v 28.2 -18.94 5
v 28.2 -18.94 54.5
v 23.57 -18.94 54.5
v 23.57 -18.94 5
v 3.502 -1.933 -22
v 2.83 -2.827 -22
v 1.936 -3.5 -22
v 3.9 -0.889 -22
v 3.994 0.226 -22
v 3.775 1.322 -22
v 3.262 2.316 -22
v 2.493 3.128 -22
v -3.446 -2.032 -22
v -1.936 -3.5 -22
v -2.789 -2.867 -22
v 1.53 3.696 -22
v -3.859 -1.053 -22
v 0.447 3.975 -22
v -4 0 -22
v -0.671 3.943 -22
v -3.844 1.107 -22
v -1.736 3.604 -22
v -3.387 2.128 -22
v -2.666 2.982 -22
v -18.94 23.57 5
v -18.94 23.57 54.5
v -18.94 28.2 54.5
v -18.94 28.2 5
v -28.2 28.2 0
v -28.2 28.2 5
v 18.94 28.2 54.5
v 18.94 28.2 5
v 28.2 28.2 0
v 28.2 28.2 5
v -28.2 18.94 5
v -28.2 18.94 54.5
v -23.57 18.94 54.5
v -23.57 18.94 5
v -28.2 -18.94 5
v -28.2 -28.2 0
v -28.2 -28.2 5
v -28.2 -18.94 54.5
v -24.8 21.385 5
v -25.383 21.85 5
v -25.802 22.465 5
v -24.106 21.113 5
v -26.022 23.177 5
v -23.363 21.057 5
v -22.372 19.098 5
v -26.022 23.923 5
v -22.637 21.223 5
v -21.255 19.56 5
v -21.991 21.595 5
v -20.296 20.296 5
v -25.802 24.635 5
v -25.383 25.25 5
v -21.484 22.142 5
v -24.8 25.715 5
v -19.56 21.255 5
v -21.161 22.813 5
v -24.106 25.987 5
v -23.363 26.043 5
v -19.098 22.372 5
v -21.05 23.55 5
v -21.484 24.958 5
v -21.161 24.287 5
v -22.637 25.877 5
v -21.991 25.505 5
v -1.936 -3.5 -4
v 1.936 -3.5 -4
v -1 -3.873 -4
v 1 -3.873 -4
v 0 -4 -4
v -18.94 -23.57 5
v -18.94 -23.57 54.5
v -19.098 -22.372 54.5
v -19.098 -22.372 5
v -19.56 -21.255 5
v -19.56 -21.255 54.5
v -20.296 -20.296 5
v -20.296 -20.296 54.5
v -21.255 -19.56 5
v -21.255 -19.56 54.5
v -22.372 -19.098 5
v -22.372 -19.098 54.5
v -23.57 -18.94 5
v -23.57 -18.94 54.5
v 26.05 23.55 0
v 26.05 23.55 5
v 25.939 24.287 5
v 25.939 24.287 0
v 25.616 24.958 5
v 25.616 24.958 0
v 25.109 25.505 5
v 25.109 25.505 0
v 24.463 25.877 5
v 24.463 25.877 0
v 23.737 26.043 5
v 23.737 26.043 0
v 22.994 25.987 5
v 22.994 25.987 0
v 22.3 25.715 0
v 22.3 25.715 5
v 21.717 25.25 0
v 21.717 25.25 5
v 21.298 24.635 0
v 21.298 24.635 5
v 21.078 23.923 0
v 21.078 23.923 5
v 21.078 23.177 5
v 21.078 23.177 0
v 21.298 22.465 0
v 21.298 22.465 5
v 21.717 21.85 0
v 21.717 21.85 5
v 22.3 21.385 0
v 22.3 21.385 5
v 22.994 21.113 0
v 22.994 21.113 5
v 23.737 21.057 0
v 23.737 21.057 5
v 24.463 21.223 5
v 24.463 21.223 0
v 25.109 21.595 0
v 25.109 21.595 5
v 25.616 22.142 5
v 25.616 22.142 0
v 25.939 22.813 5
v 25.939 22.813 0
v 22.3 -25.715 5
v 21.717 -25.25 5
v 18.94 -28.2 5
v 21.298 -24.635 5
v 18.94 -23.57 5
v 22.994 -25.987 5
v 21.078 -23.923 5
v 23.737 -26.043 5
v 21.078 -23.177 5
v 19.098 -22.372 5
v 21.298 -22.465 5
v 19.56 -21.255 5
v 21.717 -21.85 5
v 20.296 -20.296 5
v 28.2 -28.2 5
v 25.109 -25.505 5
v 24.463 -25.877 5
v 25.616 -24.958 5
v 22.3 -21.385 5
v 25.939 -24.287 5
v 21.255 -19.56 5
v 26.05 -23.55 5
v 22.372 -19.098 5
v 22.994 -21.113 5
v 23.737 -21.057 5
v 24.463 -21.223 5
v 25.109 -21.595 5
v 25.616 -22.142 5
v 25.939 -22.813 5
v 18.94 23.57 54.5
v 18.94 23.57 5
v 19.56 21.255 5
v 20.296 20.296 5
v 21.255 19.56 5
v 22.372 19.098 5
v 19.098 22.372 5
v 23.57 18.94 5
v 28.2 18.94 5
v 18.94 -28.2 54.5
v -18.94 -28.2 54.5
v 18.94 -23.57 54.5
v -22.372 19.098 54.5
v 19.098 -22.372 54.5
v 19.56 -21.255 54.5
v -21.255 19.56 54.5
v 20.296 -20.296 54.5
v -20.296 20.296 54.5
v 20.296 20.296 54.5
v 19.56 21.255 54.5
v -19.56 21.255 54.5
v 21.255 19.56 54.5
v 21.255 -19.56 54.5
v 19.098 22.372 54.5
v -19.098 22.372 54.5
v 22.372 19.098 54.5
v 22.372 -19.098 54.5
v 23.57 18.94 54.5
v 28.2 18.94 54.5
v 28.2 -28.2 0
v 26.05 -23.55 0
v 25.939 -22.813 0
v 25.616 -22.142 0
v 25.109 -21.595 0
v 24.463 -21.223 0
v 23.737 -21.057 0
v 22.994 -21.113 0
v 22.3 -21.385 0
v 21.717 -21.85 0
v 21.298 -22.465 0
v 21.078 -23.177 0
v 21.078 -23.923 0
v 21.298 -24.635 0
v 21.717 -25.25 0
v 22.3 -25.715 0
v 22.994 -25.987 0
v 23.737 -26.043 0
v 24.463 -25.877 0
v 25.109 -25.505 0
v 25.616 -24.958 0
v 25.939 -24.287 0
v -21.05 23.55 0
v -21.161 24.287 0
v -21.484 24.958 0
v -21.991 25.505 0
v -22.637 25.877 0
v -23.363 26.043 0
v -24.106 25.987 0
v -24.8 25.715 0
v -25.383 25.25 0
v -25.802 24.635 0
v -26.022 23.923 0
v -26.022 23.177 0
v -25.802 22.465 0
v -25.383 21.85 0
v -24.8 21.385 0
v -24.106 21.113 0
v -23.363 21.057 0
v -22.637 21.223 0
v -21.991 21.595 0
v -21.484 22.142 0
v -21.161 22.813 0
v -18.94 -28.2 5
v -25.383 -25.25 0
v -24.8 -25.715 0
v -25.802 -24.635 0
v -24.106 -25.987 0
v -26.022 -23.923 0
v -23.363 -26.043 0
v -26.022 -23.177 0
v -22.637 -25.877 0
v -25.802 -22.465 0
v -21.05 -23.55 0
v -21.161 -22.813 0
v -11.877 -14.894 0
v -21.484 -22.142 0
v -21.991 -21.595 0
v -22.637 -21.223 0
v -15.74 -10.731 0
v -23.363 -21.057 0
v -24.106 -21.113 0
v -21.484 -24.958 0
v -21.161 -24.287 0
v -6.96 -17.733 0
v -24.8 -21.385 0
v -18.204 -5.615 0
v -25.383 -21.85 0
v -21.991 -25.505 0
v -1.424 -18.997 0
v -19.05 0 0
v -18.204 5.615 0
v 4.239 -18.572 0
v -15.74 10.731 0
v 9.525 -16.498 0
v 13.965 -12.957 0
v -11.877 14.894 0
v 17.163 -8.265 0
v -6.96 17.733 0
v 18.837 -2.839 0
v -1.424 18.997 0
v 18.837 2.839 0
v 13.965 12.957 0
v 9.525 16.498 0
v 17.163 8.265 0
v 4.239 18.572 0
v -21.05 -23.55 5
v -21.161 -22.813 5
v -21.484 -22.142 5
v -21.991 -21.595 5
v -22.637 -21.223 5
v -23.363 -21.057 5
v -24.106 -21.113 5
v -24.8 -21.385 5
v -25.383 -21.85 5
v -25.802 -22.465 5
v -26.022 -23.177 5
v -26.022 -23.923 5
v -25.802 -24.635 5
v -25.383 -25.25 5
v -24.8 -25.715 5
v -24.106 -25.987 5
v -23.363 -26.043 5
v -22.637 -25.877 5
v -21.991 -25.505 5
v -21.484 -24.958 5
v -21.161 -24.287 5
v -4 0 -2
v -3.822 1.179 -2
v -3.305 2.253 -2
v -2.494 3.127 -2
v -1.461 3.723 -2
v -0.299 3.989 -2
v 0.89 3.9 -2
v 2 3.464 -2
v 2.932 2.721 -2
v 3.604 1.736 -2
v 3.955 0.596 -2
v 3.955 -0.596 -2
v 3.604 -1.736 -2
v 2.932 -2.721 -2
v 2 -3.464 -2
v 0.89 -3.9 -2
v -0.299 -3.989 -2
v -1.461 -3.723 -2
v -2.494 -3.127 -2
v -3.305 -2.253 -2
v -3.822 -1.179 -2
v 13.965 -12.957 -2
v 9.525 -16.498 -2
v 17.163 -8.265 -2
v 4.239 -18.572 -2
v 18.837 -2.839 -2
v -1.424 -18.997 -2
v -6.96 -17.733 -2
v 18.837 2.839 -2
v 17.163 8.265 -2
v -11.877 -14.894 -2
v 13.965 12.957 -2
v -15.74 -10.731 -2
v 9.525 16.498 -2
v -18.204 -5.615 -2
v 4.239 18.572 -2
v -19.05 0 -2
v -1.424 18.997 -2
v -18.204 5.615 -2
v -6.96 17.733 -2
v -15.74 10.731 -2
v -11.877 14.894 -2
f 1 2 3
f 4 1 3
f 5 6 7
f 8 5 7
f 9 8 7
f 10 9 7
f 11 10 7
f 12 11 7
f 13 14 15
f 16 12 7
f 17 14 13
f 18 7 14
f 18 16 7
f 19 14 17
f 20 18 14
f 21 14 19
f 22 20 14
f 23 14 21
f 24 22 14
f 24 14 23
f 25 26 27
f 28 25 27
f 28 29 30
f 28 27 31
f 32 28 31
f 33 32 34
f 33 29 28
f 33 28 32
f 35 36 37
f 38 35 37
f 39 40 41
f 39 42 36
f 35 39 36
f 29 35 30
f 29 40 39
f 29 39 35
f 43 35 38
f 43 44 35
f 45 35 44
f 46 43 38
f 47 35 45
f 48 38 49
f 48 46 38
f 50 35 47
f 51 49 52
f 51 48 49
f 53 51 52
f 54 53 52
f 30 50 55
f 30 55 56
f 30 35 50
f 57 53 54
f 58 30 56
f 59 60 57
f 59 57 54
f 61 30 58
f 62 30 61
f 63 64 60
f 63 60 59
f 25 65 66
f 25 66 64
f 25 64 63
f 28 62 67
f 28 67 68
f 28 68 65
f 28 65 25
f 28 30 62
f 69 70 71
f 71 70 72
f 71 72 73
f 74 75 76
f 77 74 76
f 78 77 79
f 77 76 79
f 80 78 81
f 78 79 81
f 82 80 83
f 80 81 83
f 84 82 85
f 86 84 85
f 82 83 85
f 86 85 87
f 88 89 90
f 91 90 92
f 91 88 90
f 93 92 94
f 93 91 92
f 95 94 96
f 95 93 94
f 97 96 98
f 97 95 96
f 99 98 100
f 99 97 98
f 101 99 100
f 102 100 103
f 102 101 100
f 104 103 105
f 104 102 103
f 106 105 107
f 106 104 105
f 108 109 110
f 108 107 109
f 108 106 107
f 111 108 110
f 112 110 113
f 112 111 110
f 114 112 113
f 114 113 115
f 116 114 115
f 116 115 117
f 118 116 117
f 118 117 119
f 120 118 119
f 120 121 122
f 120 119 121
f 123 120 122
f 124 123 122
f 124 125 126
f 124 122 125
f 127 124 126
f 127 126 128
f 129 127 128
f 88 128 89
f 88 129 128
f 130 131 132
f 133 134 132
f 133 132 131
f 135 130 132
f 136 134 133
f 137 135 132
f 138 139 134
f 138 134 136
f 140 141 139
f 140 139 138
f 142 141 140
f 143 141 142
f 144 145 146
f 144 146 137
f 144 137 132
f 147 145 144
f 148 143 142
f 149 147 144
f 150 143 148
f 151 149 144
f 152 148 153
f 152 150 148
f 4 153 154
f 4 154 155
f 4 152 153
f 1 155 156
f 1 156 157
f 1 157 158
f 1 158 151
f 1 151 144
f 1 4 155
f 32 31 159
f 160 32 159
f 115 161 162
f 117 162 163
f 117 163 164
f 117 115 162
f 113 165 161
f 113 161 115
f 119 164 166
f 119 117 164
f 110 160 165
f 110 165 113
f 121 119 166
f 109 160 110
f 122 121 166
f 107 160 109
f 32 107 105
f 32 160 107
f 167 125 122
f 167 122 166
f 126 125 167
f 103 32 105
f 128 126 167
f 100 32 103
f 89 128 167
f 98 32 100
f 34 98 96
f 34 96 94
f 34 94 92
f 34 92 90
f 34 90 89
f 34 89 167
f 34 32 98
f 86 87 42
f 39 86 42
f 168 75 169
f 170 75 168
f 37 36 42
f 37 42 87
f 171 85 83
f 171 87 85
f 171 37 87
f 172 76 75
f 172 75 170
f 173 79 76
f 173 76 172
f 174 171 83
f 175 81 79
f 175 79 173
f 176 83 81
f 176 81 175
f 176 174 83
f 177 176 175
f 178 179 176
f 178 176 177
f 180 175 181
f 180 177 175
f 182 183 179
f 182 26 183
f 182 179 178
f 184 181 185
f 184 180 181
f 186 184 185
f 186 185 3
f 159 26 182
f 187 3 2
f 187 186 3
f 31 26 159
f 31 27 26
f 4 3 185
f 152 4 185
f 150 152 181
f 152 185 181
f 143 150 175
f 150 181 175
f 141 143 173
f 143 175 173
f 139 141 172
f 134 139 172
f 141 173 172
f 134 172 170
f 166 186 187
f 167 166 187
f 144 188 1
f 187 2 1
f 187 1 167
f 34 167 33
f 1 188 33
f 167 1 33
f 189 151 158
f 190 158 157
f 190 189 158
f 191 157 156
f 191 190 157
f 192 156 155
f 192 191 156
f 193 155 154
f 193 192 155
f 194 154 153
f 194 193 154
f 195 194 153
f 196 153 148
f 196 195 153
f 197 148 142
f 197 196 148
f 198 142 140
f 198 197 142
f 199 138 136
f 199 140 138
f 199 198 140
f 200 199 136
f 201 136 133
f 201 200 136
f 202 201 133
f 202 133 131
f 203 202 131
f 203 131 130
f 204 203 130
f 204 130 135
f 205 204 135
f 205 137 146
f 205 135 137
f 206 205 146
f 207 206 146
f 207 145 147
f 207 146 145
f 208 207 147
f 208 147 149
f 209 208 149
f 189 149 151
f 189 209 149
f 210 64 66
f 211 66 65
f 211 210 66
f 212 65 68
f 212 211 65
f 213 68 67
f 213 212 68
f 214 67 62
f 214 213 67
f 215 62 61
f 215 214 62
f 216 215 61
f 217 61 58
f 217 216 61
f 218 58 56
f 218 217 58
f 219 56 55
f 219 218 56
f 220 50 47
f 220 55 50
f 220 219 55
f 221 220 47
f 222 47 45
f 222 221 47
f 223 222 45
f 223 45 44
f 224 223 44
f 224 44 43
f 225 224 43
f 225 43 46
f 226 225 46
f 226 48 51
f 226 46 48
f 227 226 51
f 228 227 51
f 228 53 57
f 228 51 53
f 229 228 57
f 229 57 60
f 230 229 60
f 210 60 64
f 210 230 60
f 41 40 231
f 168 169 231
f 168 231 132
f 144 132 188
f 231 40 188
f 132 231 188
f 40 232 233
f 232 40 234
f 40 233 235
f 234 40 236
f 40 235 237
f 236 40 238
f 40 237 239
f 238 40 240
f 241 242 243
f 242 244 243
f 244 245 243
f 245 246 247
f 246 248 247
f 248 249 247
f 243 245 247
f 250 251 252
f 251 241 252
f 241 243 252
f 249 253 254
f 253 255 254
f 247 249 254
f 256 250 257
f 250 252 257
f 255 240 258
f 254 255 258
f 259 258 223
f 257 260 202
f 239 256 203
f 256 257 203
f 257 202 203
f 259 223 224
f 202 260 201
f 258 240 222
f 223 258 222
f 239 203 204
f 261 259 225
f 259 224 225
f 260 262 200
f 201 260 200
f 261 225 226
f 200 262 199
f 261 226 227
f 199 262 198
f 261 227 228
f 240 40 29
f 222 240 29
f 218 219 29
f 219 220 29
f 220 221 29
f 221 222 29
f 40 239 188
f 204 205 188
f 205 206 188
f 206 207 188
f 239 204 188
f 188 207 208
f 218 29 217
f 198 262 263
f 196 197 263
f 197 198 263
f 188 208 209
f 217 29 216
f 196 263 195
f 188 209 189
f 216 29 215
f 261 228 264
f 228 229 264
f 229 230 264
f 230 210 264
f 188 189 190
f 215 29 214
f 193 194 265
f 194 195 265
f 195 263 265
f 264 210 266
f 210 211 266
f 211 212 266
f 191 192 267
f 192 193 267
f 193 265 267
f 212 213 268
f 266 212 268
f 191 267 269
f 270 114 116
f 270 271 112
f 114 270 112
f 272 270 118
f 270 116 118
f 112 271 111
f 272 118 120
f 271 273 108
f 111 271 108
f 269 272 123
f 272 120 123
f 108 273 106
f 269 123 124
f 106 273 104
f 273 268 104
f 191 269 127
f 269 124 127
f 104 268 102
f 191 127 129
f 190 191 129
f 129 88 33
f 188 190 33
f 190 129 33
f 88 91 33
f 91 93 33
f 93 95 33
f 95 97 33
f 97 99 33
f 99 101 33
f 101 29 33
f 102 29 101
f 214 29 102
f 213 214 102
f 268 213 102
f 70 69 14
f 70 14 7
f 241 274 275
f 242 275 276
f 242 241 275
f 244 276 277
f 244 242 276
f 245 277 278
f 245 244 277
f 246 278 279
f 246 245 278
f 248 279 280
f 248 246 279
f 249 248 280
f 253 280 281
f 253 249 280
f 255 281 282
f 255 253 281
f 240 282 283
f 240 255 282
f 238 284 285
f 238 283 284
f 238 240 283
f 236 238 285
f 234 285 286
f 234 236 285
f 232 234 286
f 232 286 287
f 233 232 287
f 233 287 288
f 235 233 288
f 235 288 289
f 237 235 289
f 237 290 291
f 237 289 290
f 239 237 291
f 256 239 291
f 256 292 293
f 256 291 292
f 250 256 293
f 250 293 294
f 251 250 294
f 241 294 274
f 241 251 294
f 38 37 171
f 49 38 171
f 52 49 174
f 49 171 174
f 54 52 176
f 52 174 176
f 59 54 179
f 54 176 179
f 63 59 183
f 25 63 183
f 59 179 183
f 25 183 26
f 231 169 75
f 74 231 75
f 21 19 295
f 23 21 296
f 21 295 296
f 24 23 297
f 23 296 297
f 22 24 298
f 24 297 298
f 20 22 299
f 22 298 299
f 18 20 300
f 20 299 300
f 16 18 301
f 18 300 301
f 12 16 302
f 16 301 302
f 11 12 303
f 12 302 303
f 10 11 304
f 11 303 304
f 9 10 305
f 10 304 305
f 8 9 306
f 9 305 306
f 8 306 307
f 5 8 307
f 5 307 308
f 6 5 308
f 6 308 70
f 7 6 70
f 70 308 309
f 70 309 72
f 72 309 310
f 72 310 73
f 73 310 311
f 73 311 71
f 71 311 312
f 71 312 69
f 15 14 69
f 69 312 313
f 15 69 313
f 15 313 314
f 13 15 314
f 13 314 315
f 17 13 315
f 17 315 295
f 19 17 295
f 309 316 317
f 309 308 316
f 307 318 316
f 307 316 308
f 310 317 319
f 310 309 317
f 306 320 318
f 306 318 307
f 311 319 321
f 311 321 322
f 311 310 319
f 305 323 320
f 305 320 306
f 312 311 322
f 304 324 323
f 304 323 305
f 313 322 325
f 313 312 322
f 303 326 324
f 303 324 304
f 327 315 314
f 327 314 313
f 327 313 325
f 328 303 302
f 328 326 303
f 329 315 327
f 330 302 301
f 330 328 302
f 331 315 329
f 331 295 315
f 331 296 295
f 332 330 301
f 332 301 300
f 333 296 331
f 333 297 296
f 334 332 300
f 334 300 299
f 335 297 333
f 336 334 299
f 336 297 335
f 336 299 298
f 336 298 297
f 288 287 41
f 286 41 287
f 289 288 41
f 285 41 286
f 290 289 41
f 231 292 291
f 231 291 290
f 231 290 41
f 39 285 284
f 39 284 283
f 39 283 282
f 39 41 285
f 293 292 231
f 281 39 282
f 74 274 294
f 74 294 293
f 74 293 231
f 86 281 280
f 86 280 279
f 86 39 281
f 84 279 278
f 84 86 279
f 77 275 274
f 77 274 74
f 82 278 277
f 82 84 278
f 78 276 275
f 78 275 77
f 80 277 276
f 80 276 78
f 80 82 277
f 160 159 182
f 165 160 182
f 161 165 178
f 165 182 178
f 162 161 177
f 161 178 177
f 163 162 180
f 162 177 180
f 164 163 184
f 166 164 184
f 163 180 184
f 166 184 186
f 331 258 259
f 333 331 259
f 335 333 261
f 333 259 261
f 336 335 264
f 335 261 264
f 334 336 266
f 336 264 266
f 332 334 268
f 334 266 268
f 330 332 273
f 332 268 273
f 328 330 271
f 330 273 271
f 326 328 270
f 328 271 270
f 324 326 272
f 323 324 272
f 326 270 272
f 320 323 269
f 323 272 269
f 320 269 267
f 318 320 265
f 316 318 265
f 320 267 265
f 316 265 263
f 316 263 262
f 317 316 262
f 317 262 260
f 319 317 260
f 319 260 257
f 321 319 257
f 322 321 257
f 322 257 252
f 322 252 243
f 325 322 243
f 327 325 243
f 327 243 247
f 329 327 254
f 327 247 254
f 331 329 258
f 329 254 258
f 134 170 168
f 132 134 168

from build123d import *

# Parameters (mm, degrees)
SKETCH_1_W          = 56.4
SKETCH_1_H          = 56.4
SKETCH_1_R          = 2.5
EXTRUDE_1_DEPTH     = 54.5
SKETCH_2_R          = 4
EXTRUDE_2_DEPTH     = 22
CUT_EXTRUDE_START   = -18
CUT_EXTRUDE_1_DEPTH = 18
SKETCH_4_R          = 19.05
EXTRUDE_3_DEPTH     = 2
CUT_EXTRUDE_2_DEPTH = 49.5


with BuildPart() as part:
    # 草图1 → 凸台-拉伸1 (new body)
    with BuildSketch(Plane.XY):
        Rectangle(SKETCH_1_W, SKETCH_1_H)
        with Locations((23.55, -23.55)):
            Circle(SKETCH_1_R, mode=Mode.SUBTRACT)
        with Locations((-23.55, -23.55)):
            Circle(SKETCH_1_R, mode=Mode.SUBTRACT)
        with Locations((23.55, 23.55)):
            Circle(SKETCH_1_R, mode=Mode.SUBTRACT)
        with Locations((-23.55, 23.55)):
            Circle(SKETCH_1_R, mode=Mode.SUBTRACT)
    extrude(amount=EXTRUDE_1_DEPTH)

    # 草图2 → 凸台-拉伸2 (add)
    with BuildSketch(Plane(origin=(0, 0, 0), x_dir=(-1, 0, 0), z_dir=(0, 0, -1))):
        Circle(SKETCH_2_R)
    extrude(amount=EXTRUDE_2_DEPTH)

    # 草图3 → 切除-拉伸1 (cut)
    with BuildSketch(Plane(origin=(0, 0, -22), x_dir=(-1, 0, 0), z_dir=(0, 0, -1)).offset(CUT_EXTRUDE_START)):
        with BuildLine():
            Line((1.936491673, -3.5), (-1.936491673, -3.5))
            ThreePointArc((-1.936491673, -3.5), (0, -4), (1.936491673, -3.5))
        make_face()
    extrude(amount=CUT_EXTRUDE_1_DEPTH, mode=Mode.SUBTRACT)

    # 草图4 → 凸台-拉伸3 (add)
    with BuildSketch(Plane(origin=(0, 0, 0), x_dir=(-1, 0, 0), z_dir=(0, 0, -1))):
        Circle(SKETCH_4_R)
    extrude(amount=EXTRUDE_3_DEPTH)

    # 草图5 → 切除-拉伸2 (cut)
    with BuildSketch(Plane.XY.offset(54.5)):
        with BuildLine():
            Line((23.57, 18.94), (28.2, 18.94))
            Line((28.2, 18.94), (28.2, 28.2))
            Line((28.2, 28.2), (18.94, 28.2))
            Line((18.94, 28.2), (18.94, 23.57))
            ThreePointArc((18.94, 23.57), (20.296095603, 20.296095603), (23.57, 18.94))
        make_face()
        with BuildLine():
            Line((18.94, -23.57), (18.94, -28.2))
            Line((18.94, -28.2), (28.2, -28.2))
            Line((28.2, -28.2), (28.2, -18.94))
            Line((28.2, -18.94), (23.57, -18.94))
            ThreePointArc((23.57, -18.94), (20.296095603, -20.296095603), (18.94, -23.57))
        make_face()
        with BuildLine():
            Line((-23.57, -18.94), (-28.2, -18.94))
            Line((-28.2, -18.94), (-28.2, -28.2))
            Line((-28.2, -28.2), (-18.94, -28.2))
            Line((-18.94, -28.2), (-18.94, -23.57))
            ThreePointArc((-18.94, -23.57), (-20.296095603, -20.296095603), (-23.57, -18.94))
        make_face()
        with BuildLine():
            Line((-18.94, 23.57), (-18.94, 28.2))
            Line((-18.94, 28.2), (-28.2, 28.2))
            Line((-28.2, 28.2), (-28.2, 18.94))
            Line((-28.2, 18.94), (-23.57, 18.94))
            ThreePointArc((-23.57, 18.94), (-20.296095603, 20.296095603), (-18.94, 23.57))
        make_face()
    extrude(amount=-CUT_EXTRUDE_2_DEPTH, mode=Mode.SUBTRACT)


solid = part.part
